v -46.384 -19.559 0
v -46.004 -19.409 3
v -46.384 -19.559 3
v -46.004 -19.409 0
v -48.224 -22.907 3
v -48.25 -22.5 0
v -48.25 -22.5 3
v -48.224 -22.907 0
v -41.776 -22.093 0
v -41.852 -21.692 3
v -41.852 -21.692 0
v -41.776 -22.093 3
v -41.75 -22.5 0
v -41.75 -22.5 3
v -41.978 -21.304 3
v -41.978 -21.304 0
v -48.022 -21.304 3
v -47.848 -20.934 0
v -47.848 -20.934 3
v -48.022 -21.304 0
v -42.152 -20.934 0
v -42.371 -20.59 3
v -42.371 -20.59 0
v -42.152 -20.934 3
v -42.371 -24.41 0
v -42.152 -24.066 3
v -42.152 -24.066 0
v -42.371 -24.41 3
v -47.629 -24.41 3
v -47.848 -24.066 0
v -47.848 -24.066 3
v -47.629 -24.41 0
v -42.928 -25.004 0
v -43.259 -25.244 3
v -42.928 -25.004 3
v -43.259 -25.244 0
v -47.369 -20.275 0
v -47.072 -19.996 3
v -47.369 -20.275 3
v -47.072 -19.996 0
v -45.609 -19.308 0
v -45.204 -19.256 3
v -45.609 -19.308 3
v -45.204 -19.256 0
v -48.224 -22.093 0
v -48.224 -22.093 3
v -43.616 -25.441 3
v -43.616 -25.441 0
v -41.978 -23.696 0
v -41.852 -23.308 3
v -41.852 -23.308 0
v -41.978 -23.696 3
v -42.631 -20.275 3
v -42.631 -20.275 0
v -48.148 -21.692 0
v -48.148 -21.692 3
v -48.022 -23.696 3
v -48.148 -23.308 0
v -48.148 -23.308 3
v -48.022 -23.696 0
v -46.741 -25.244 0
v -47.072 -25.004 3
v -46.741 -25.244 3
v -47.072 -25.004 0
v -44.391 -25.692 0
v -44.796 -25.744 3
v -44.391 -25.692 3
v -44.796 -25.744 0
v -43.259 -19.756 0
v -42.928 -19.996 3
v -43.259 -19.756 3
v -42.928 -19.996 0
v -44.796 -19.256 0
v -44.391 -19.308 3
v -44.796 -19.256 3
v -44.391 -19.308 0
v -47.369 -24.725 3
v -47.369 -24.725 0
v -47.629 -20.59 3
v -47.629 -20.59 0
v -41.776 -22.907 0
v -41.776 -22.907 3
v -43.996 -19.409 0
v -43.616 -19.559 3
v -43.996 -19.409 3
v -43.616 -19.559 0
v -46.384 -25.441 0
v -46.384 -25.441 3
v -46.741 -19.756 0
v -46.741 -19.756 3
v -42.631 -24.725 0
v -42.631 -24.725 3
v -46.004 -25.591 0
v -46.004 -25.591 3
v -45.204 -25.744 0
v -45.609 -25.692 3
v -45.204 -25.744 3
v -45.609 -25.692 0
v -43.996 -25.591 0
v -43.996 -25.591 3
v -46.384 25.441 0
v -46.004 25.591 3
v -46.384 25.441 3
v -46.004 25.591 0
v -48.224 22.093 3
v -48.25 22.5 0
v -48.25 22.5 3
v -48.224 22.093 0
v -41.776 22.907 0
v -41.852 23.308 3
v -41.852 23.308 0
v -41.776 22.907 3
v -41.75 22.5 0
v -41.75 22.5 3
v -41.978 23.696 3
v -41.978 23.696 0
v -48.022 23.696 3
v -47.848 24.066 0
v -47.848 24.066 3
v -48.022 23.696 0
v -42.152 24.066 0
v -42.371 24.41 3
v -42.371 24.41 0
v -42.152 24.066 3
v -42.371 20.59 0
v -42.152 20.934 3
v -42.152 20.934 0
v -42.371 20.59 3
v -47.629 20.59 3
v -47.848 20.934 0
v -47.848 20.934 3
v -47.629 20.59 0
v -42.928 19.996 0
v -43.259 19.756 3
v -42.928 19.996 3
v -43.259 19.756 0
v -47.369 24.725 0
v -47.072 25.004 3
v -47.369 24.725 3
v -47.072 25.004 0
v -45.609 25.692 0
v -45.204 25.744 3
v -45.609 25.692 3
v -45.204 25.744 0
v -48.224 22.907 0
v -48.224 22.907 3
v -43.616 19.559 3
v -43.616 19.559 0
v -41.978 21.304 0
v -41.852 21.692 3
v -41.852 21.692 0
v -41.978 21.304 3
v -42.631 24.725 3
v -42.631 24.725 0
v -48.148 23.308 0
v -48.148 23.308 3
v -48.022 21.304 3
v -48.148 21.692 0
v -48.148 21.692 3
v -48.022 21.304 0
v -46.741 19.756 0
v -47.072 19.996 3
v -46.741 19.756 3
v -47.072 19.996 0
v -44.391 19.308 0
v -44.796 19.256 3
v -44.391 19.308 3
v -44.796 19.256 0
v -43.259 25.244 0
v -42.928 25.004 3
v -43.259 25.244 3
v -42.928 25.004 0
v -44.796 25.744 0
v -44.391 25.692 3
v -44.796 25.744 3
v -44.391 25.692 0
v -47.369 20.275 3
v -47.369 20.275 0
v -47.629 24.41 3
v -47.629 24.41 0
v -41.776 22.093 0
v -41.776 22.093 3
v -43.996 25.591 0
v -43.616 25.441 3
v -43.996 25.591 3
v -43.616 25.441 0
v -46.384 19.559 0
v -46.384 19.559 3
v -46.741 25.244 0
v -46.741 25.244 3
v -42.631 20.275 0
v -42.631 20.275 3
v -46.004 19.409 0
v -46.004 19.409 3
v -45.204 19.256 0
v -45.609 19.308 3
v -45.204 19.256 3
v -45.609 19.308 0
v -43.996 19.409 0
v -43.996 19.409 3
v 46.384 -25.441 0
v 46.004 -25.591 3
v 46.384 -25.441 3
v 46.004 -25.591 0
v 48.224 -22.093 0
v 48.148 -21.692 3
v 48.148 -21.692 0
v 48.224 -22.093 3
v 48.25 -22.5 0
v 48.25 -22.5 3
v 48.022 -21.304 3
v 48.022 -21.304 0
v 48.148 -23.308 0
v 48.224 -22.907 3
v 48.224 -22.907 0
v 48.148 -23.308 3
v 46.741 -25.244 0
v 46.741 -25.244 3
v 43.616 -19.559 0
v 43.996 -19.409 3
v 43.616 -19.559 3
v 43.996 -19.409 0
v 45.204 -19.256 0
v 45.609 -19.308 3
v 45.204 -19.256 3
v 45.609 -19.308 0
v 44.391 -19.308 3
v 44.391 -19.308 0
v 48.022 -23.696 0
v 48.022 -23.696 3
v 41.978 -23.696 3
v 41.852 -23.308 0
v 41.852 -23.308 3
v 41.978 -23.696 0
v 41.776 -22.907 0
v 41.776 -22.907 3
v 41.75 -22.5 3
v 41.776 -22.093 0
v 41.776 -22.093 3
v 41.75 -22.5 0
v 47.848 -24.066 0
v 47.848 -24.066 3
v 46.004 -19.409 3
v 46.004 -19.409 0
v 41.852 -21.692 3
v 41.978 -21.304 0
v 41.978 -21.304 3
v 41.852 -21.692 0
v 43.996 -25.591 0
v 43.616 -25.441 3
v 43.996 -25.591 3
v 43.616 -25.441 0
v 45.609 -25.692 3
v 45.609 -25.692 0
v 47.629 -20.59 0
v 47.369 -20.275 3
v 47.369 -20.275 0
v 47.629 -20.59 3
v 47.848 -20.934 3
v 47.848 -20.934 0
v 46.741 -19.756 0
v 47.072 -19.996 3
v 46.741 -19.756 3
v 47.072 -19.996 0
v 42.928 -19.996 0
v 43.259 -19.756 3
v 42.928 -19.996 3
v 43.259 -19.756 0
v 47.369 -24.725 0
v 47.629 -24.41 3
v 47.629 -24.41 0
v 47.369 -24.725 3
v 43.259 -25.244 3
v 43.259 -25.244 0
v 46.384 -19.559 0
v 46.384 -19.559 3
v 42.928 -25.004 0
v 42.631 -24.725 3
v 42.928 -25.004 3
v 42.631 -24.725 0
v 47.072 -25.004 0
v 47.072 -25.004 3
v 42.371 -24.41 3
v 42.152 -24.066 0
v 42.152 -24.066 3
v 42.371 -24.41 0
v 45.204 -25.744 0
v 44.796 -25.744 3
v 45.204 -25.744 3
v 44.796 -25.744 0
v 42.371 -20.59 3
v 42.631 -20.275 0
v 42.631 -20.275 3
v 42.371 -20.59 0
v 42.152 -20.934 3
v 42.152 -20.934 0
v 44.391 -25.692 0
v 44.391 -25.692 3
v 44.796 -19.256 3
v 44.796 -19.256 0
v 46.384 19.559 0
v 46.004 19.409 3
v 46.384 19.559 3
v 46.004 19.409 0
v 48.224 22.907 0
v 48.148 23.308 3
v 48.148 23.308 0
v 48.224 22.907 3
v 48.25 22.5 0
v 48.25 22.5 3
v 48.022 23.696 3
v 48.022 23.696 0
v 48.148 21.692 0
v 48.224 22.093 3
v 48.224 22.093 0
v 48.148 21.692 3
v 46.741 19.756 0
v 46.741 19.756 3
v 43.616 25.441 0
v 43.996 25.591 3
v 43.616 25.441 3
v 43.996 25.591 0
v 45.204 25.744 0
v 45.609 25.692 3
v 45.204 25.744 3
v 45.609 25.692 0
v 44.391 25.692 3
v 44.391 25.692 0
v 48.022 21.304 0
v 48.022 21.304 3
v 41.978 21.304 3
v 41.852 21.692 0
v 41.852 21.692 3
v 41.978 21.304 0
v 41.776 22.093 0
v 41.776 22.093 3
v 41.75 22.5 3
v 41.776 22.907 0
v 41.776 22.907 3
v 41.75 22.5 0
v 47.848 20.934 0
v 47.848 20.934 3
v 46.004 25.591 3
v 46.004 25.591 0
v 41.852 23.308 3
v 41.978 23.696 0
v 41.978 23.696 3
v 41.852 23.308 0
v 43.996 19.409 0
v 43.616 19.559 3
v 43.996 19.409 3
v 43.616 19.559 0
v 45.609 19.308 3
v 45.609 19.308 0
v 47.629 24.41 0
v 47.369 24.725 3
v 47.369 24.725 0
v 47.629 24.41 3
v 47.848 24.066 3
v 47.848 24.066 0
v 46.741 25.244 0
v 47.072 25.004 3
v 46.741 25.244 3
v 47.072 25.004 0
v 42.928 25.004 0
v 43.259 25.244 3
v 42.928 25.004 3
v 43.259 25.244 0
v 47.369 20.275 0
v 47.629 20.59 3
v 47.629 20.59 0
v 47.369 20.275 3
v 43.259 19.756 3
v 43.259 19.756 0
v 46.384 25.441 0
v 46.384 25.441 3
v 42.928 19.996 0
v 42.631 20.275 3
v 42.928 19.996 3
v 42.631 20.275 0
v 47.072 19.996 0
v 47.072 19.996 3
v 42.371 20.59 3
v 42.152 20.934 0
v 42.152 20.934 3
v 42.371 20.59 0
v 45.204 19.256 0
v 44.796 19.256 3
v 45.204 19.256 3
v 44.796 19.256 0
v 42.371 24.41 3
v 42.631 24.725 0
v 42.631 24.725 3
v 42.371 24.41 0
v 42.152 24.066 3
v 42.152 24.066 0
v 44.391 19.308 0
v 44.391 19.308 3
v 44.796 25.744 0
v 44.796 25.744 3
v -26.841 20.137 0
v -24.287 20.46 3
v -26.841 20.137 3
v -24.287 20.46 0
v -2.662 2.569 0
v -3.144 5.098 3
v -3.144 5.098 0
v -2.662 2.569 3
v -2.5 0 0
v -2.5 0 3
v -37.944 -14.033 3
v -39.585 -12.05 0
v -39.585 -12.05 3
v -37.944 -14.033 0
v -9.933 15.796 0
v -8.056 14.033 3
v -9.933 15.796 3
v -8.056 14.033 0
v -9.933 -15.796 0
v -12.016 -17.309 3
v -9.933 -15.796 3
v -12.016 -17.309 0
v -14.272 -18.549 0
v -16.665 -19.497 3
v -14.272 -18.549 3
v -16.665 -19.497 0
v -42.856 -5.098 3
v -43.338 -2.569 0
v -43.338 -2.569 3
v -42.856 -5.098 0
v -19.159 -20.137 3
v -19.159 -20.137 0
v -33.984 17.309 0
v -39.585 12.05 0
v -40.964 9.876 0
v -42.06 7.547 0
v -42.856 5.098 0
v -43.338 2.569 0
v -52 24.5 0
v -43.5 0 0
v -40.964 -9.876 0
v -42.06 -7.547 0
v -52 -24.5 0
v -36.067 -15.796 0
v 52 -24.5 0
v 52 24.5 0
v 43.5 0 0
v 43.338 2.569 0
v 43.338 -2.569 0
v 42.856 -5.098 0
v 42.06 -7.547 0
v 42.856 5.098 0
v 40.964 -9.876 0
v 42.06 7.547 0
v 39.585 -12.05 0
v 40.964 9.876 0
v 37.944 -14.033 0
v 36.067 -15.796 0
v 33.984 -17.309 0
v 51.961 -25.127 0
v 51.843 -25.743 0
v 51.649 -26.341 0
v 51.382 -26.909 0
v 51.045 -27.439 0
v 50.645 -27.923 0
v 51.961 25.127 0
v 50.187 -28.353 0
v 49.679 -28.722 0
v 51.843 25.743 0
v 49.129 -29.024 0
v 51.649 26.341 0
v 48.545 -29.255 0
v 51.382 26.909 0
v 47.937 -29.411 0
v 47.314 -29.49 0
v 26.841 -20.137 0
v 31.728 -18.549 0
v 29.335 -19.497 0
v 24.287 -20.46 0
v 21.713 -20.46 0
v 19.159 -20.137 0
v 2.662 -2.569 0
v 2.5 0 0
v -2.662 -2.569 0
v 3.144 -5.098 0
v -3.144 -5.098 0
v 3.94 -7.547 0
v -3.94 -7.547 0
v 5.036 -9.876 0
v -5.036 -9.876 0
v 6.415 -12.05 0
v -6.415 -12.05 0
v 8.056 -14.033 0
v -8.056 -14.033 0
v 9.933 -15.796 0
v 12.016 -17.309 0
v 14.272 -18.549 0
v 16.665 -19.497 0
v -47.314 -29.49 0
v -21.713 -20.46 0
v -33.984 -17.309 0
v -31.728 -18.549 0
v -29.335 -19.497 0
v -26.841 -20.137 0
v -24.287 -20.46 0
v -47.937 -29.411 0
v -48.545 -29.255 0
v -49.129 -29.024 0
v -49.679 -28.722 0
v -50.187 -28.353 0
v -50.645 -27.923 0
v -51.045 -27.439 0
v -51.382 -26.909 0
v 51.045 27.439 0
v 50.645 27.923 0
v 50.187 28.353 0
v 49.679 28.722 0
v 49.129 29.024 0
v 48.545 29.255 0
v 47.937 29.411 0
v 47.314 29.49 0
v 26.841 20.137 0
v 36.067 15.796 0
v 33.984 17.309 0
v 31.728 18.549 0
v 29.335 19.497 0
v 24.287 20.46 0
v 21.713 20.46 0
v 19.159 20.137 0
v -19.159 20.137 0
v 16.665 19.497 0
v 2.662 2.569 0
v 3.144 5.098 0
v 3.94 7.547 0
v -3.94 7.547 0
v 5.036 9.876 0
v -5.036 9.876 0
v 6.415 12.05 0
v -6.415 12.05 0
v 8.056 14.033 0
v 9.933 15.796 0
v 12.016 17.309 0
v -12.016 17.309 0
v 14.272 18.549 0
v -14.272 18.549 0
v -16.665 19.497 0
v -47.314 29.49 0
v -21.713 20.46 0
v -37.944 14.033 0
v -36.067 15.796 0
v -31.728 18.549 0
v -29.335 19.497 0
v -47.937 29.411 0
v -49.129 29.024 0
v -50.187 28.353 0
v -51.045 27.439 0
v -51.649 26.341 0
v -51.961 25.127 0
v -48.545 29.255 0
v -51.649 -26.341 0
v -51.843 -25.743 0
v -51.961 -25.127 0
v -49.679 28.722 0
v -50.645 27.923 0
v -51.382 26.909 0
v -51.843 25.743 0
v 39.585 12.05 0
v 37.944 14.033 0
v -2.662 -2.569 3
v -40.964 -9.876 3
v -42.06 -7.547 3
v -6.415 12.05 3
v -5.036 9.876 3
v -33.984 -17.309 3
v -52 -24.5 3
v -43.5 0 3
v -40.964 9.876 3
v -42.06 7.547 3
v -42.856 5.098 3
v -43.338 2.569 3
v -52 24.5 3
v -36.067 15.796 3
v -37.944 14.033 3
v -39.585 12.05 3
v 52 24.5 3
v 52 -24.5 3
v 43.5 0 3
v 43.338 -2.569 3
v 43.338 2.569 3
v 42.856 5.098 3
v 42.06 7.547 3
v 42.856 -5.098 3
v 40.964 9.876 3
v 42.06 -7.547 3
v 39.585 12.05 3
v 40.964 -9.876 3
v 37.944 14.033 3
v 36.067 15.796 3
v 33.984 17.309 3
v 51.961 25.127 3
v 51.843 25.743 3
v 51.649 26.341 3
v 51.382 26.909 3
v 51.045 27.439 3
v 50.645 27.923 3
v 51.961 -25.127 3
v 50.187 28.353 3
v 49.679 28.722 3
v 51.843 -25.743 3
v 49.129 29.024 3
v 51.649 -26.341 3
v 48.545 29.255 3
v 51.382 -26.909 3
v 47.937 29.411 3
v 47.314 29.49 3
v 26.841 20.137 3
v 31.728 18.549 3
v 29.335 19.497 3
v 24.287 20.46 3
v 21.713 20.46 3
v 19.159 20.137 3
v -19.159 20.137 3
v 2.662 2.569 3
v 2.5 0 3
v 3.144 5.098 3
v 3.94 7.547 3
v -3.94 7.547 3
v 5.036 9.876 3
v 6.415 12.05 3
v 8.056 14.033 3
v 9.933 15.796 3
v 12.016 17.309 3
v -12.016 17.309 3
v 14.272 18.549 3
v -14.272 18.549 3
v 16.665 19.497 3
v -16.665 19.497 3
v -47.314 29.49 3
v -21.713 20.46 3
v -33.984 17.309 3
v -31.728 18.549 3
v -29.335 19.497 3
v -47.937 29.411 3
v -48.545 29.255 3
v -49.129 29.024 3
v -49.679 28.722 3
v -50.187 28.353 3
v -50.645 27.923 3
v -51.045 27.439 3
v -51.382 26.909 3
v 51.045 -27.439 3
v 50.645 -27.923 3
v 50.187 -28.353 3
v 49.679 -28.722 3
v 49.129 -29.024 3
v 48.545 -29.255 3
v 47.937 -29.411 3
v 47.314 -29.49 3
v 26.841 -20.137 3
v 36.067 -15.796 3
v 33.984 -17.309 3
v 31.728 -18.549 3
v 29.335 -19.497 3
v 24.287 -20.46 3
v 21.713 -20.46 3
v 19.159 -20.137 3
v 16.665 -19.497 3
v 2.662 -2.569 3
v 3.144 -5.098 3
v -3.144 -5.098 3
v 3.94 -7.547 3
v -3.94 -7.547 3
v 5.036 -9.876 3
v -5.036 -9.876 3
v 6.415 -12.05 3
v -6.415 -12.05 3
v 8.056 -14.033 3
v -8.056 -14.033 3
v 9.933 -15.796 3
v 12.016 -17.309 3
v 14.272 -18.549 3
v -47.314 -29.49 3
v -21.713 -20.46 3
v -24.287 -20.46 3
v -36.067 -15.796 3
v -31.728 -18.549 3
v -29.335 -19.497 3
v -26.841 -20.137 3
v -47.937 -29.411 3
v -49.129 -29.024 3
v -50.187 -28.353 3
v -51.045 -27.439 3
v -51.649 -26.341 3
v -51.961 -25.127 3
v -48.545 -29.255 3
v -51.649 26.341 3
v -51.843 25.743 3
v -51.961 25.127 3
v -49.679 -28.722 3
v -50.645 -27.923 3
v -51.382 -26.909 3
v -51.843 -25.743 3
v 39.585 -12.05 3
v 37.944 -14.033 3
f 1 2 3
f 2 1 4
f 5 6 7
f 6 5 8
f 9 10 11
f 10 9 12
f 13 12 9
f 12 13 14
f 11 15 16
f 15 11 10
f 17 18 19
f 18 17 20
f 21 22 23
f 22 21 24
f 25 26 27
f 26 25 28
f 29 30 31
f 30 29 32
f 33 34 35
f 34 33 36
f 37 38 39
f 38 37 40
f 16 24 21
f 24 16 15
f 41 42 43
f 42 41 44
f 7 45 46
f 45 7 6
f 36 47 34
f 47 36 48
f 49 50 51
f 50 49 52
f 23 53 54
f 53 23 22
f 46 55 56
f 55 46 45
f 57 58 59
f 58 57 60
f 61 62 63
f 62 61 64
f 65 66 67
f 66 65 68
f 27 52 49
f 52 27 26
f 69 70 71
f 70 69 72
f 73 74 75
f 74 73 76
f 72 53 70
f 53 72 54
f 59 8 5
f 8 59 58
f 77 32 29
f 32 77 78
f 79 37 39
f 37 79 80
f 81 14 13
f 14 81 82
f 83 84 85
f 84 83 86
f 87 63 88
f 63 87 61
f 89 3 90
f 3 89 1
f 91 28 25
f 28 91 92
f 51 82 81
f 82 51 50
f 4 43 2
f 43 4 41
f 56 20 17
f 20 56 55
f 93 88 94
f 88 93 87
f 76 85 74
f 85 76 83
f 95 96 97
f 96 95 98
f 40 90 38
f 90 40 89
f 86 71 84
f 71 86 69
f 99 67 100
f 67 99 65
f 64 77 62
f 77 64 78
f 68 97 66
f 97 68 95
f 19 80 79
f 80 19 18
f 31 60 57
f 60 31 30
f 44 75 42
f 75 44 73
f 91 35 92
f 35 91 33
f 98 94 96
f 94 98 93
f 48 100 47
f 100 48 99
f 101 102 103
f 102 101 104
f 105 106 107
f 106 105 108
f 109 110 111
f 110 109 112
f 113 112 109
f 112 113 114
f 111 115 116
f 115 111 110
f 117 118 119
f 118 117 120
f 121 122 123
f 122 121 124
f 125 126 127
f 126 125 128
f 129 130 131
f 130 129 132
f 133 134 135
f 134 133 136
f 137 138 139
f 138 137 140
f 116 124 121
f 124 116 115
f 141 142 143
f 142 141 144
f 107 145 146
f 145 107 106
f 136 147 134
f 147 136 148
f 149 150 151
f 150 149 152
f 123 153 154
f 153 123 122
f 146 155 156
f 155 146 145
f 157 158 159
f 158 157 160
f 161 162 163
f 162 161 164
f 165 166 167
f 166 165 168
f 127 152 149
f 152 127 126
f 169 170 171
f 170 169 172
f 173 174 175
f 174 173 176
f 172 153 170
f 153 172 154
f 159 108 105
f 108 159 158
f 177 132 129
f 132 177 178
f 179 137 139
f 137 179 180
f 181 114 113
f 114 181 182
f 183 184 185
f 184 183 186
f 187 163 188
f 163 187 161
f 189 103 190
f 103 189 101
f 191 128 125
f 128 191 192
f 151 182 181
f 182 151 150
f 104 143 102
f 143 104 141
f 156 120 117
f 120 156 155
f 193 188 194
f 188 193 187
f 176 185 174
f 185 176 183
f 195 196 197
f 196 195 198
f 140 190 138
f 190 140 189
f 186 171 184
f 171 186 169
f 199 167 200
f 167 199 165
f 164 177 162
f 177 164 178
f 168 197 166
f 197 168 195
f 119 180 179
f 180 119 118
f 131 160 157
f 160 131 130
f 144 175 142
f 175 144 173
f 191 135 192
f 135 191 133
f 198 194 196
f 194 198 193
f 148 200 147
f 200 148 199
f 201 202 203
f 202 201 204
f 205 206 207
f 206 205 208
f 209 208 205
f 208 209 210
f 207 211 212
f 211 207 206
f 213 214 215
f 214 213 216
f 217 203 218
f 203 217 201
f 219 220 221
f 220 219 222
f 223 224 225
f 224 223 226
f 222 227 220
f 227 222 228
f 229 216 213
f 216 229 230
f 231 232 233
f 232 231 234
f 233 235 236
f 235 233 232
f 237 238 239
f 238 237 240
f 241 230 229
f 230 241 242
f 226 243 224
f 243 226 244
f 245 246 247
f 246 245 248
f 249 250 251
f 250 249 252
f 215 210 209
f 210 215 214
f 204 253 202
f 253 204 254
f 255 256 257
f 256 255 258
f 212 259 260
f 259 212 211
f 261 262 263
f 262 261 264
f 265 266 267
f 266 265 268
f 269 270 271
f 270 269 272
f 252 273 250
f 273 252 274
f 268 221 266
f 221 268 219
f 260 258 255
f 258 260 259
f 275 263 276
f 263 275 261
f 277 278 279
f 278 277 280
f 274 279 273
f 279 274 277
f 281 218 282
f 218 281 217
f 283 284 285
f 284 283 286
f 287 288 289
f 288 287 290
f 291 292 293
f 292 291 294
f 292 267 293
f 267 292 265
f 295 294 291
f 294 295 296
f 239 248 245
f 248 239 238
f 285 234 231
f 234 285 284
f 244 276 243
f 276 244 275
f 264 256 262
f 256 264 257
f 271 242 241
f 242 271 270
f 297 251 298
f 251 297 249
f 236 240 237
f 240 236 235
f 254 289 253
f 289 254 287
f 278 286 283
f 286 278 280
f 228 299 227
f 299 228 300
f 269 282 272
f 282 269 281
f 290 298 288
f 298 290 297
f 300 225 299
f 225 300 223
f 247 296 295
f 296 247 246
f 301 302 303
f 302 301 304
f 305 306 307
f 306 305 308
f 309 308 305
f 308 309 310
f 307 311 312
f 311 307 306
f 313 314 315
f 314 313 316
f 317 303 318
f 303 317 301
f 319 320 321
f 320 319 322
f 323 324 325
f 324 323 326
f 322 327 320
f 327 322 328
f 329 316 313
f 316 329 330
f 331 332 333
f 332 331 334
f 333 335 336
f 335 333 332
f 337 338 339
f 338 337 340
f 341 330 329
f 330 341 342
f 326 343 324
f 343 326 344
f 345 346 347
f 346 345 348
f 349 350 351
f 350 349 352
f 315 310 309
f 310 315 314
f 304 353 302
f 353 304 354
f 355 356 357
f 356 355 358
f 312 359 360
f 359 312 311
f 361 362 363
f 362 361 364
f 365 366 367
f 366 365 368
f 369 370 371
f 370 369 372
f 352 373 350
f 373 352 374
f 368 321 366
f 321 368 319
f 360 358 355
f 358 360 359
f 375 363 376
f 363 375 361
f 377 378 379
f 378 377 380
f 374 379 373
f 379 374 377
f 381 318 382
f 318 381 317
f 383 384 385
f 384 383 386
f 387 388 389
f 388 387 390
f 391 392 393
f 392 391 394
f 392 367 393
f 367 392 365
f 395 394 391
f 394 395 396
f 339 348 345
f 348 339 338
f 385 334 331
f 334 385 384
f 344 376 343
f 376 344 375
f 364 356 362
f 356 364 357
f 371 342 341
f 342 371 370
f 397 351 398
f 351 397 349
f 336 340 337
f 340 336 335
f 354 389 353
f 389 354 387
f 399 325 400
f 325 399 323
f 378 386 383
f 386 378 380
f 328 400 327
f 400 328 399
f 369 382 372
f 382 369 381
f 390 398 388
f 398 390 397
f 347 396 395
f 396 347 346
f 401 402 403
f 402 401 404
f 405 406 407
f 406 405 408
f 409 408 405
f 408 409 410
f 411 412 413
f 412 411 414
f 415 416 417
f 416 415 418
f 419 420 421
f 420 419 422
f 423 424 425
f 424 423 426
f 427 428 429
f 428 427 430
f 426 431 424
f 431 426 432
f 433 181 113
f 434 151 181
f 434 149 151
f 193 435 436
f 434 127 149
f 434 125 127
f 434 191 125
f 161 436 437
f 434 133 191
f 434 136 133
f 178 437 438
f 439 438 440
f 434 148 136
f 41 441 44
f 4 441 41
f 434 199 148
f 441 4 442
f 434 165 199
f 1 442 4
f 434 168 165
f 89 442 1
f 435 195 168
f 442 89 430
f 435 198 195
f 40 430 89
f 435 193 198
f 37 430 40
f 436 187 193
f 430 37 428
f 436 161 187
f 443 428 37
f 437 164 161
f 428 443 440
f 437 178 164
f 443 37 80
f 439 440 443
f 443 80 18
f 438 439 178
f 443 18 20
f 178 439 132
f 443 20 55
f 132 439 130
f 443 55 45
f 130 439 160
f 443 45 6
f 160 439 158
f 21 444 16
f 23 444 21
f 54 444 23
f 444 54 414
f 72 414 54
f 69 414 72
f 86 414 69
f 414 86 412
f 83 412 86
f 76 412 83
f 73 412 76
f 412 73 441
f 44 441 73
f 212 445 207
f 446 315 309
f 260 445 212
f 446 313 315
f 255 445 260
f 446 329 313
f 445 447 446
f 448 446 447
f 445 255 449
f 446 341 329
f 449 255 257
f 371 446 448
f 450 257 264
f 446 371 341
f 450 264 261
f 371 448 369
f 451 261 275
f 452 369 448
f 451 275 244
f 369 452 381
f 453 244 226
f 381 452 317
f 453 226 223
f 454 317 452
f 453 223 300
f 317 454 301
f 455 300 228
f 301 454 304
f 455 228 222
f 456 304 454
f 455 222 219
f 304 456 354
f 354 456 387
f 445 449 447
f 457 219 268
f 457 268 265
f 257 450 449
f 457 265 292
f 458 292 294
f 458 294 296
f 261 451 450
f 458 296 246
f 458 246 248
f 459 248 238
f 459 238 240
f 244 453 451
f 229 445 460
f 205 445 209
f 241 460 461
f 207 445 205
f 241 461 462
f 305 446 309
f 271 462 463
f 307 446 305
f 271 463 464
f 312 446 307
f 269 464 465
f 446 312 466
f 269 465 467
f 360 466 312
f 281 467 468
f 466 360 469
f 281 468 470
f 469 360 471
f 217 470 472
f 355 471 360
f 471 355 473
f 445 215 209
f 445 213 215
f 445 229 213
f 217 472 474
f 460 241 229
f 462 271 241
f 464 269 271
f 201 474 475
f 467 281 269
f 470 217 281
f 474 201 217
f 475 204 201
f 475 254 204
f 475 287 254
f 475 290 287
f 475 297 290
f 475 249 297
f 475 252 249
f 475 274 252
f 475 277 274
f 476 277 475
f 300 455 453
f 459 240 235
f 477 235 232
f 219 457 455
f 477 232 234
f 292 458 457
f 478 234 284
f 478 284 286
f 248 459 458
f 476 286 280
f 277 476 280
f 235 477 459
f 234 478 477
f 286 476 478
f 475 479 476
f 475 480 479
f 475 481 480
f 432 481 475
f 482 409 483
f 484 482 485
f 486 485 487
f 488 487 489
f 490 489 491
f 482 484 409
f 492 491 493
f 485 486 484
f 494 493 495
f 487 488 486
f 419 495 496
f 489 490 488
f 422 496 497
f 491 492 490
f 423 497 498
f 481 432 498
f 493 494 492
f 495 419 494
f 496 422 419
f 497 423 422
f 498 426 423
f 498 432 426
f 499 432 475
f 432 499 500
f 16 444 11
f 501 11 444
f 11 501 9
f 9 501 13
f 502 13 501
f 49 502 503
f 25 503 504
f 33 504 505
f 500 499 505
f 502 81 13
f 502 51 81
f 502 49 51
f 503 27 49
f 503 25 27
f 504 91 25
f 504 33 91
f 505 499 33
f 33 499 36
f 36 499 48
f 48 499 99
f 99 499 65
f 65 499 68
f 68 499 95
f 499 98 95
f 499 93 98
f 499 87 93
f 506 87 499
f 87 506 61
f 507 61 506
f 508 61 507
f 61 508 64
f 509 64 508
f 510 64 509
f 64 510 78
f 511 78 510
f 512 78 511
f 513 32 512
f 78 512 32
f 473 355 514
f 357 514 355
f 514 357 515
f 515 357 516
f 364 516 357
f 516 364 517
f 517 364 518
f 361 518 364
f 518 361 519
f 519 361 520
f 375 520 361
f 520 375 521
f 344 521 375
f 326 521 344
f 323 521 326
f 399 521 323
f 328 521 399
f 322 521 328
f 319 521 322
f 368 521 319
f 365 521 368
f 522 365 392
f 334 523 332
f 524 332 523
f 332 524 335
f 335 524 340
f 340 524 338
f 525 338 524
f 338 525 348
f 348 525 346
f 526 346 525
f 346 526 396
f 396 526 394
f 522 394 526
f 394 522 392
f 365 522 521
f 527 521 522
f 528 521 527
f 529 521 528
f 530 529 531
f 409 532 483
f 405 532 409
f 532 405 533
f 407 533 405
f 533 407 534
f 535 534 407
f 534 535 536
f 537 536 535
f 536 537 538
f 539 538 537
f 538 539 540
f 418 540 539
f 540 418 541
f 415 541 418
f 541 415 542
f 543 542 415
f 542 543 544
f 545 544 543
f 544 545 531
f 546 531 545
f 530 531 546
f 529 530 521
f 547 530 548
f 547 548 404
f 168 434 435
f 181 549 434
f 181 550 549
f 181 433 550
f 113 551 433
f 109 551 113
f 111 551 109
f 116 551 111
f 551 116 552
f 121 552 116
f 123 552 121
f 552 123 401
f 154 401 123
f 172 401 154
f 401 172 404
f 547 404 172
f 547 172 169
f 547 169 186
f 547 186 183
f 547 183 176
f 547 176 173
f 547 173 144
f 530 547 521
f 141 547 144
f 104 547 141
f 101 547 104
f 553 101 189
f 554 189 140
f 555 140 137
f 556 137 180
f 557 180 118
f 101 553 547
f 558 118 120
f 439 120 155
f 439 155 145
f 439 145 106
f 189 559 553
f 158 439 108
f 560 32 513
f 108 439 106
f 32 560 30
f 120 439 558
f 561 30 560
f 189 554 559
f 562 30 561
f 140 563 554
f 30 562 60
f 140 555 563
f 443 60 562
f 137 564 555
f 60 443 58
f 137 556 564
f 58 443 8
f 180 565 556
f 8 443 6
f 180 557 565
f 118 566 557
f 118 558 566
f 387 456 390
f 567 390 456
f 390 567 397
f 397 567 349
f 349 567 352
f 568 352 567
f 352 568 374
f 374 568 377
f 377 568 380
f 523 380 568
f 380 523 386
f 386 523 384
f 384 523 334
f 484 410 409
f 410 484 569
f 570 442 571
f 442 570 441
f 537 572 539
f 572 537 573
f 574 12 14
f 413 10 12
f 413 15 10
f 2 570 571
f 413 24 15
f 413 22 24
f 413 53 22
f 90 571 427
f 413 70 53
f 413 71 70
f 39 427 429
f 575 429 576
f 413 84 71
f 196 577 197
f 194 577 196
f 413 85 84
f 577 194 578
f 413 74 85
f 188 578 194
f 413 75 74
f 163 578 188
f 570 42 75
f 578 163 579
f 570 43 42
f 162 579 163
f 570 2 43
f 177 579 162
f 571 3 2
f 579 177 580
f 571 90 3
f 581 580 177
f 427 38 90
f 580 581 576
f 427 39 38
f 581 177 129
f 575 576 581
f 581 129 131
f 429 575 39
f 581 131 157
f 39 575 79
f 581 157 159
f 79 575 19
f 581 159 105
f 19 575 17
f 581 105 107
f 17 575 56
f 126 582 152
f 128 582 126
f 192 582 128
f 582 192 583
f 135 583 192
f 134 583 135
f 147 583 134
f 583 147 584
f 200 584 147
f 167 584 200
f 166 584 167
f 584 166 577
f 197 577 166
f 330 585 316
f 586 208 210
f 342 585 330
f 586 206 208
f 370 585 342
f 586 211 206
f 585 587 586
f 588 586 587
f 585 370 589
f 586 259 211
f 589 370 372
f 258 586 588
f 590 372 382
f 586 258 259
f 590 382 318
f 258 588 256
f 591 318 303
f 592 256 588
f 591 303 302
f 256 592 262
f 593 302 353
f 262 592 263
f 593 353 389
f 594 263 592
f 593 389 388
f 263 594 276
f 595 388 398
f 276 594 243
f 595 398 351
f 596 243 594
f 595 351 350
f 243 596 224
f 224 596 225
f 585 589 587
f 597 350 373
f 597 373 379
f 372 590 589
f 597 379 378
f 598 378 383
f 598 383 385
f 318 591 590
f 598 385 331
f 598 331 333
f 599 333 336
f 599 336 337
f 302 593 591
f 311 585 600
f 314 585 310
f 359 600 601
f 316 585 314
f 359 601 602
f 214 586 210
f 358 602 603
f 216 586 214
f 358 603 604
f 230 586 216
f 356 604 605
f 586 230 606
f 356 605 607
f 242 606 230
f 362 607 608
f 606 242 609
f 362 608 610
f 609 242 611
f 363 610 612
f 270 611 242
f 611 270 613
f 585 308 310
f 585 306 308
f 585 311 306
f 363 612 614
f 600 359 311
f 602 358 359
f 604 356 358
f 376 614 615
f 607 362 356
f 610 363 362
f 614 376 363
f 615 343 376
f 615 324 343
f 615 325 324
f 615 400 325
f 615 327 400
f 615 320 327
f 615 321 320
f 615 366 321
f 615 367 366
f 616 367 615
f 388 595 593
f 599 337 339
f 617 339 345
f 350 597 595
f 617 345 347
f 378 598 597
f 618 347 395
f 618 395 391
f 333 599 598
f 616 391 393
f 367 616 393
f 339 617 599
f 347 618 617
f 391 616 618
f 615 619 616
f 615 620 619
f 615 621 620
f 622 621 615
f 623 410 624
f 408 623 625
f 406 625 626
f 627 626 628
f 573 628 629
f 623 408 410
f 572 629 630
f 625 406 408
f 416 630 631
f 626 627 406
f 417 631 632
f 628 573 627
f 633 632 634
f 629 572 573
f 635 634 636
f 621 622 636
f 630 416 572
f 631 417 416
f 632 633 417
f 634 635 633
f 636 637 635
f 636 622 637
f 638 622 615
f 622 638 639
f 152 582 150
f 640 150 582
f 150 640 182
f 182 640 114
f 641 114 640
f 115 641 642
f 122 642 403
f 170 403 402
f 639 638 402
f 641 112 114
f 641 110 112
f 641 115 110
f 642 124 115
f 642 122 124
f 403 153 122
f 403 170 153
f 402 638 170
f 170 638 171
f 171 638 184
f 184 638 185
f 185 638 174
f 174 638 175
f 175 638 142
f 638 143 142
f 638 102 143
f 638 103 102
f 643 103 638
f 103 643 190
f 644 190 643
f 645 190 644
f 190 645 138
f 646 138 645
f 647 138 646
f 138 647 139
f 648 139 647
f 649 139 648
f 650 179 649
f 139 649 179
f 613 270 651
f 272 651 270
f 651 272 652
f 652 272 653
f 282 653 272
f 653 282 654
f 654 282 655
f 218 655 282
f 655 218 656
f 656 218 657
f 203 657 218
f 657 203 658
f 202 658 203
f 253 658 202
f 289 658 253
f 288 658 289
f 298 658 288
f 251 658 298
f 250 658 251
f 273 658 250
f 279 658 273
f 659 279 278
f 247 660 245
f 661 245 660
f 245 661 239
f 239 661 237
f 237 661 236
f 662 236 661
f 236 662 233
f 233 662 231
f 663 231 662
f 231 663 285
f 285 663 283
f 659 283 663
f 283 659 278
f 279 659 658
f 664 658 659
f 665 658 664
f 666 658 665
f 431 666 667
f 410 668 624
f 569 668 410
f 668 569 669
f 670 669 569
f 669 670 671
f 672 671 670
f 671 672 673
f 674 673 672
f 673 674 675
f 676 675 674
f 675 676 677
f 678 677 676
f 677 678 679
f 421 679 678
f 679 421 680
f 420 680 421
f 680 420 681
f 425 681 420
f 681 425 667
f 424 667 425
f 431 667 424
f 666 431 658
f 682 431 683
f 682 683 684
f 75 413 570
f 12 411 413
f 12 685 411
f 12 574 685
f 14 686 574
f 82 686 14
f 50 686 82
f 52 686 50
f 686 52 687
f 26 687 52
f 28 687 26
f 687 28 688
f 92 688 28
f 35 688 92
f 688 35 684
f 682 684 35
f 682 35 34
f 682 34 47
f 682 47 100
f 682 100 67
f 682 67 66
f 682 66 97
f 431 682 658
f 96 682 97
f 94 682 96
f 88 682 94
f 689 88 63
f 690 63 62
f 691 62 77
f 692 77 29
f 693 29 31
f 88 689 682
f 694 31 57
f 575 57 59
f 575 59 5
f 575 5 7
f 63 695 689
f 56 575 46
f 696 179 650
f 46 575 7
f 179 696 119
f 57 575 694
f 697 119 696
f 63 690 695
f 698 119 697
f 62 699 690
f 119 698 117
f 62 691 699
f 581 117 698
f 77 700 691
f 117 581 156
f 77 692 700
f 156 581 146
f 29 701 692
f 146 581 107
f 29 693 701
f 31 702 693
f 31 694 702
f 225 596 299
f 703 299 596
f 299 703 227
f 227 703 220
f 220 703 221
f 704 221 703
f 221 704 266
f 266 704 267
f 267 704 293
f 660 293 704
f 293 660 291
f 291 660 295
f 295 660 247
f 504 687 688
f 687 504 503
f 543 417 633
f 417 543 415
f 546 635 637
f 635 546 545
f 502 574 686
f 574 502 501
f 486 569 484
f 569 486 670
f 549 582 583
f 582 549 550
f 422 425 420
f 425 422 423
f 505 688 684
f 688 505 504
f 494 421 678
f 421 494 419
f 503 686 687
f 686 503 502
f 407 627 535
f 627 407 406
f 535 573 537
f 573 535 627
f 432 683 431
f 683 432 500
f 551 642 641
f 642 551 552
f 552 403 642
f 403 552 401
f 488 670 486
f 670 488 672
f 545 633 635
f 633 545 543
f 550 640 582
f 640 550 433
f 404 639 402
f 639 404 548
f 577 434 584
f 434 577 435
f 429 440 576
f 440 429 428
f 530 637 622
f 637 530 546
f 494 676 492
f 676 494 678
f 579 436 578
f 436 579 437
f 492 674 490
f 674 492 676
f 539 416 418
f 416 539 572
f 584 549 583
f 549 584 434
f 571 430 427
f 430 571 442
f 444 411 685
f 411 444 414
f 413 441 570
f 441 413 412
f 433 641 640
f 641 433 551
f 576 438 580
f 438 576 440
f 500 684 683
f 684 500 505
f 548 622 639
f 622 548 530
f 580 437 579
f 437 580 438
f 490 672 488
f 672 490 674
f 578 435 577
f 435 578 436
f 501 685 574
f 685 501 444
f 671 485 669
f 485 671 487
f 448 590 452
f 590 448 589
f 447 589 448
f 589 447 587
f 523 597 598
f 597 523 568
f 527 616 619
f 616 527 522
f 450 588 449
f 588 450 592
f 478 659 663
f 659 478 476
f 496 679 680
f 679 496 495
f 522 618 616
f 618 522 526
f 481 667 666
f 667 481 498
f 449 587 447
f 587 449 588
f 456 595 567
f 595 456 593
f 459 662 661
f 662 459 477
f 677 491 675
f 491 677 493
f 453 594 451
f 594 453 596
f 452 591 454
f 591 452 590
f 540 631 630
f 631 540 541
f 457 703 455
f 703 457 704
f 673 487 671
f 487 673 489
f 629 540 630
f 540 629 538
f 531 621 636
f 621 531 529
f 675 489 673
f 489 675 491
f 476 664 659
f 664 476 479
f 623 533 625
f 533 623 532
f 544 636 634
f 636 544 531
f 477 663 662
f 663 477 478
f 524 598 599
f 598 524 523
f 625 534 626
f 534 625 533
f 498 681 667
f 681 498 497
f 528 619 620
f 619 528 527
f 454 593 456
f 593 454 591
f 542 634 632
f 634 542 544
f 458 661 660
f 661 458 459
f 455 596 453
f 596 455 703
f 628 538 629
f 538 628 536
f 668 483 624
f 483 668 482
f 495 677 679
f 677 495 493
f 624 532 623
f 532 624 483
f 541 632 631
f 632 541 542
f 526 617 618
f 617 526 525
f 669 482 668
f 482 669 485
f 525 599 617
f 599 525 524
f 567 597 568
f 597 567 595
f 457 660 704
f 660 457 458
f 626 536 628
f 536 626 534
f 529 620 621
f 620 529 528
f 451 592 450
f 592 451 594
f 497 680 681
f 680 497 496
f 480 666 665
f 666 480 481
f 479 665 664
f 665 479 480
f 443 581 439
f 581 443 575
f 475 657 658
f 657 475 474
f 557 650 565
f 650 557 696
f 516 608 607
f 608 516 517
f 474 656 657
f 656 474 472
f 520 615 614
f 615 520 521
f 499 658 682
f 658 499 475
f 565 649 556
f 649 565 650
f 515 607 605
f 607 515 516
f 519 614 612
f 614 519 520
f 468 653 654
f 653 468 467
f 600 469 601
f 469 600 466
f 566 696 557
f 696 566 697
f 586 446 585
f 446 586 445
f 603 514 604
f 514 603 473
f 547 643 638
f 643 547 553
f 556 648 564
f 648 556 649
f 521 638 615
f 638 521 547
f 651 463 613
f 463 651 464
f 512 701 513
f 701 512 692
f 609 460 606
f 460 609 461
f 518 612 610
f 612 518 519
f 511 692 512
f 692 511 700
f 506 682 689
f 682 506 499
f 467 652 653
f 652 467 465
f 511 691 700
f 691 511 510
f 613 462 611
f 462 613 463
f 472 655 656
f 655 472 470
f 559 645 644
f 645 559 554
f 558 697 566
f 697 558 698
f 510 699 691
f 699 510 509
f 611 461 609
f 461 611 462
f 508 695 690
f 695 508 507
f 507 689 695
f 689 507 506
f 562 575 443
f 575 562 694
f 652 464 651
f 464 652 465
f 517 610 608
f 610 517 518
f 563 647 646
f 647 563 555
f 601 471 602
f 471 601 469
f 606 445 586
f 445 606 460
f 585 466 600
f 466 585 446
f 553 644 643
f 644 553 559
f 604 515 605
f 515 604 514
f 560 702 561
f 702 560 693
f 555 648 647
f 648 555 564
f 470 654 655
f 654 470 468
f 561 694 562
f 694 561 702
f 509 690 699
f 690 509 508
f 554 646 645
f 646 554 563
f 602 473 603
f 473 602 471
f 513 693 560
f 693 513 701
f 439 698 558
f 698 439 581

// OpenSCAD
$fn = 50;

difference() {
	union() {
		hull() {
			translate(v = [-47.0, 24.5, 0]) {
				cylinder(h = 3, r = 5);
			}
			translate(v = [47.0, 24.5, 0]) {
				cylinder(h = 3, r = 5);
			}
			translate(v = [-47.0, -24.5, 0]) {
				cylinder(h = 3, r = 5);
			}
			translate(v = [47.0, -24.5, 0]) {
				cylinder(h = 3, r = 5);
			}
		}
	}
	union() {
		translate(v = [-45.0, -22.5, -100.0]) {
			cylinder(h = 200, r = 3.25);
		}
		translate(v = [-45.0, 22.5, -100.0]) {
			cylinder(h = 200, r = 3.25);
		}
		translate(v = [45.0, -22.5, -100.0]) {
			cylinder(h = 200, r = 3.25);
		}
		translate(v = [45.0, 22.5, -100.0]) {
			cylinder(h = 200, r = 3.25);
		}
		translate(v = [-45.0, -22.5, -100.0]) {
			cylinder(h = 200, r = 1.8);
		}
		translate(v = [-45.0, 22.5, -100.0]) {
			cylinder(h = 200, r = 1.8);
		}
		translate(v = [45.0, -22.5, -100.0]) {
			cylinder(h = 200, r = 1.8);
		}
		translate(v = [45.0, 22.5, -100.0]) {
			cylinder(h = 200, r = 1.8);
		}
		translate(v = [-23.0, 0, 0.0]) {
			cylinder(h = 3, r = 20.5);
		}
		translate(v = [23.0, 0, 0.0]) {
			cylinder(h = 3, r = 20.5);
		}
	}
}
